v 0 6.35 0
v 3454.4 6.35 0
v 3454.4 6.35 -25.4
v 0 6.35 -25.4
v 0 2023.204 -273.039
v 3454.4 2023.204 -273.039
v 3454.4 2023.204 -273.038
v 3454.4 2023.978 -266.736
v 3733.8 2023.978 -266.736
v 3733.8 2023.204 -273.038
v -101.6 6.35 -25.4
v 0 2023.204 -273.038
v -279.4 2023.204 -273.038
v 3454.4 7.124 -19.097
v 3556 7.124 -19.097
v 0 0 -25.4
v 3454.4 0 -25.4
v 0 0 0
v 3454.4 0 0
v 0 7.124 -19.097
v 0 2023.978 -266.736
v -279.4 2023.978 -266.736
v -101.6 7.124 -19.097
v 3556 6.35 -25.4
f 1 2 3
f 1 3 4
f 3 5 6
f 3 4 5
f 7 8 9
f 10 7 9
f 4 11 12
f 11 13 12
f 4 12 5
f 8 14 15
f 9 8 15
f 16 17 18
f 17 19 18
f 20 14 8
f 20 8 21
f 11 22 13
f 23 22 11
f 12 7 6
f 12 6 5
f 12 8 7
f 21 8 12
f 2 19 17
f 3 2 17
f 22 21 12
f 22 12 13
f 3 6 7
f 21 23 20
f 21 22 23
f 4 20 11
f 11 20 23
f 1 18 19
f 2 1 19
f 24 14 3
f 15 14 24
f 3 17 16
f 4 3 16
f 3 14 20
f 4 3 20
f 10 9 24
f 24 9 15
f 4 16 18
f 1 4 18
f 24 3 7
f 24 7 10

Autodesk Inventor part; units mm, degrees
ref_plane "YZ Plane" through (0, 0, 0) normal (1, 0, 0) x (0, 1, 0)
ref_plane "XZ Plane" through (0, 0, 0) normal (0, 1, 0) x (-1, 0, 0)
sketch "Sketch1" plane through (0, 0, 0) normal (0, 1, 0) x (-1, 0, 0)
  line L0 (0, 0) -> (-3454.4, 0)
  line L1 (-3454.4, 0) -> (-3454.4, -25.4)
  line L2 (-3454.4, -25.4) -> (0, -25.4)
  line L3 (0, -25.4) -> (0, 0)
  dimension "d0" = 3454.4
  dimension "d1" = 25.4
extrude "bottomMateSurface" add sketch "Sketch1" along normal blind 6.35
ref_plane "Work Plane1" through (3454.4, 6.35, -25.4) normal (0, 0.9925, -0.1219) x (-1, 0, 0)
sketch "Sketch2" plane through (3454.4, 6.35, -25.4) normal (0, 0.9925, -0.1219) x (-1, 0, 0)
  line L0 (0, 6.35) -> (3454.4, 6.35)
  line L1 (3454.4, 6.35) -> (3454.4, 0)
  line L2 (3454.4, 0) -> (0, 0)
  line L3 (0, 0) -> (0, 6.35)
  point P0 (3454.4, 24.4368)
  dimension "d5" = 3454.4
  dimension "d6" = 6.35
extrude "centralPanelPortion" add sketch "Sketch2" along normal blind 2032
sketch "Sketch5" plane through (0, 7.1239, -19.0973) normal (0, 0.1219, 0.9925) x (1, 0, 0)
  line L0 (3454.4, 0) -> (3454.4, 2032) projected
  line L1 (0, 0) -> (0, 2032) projected
  line L2 (3454.4, 0) -> (3556, 0)
  line L3 (3454.4, 2032) -> (3733.8, 2032)
  line L4 (3733.8, 2032) -> (3556, 0)
  point P0 (0, -9.3981)
  dimension "d16" = 101.6
  dimension "d17" = 279.4
extrude "extensionRight" add sketch "Sketch5" against normal blind 6.35
sketch "Sketch6" plane through (0, 2023.9777, -266.7358) normal (0, 0.1219, 0.9925) x (1, 0, 0)
  line L0 (0, -2032) -> (0, 0) projected
  line L1 (0, -2032) -> (-101.6, -2032)
  line L2 (0, 0) -> (-279.4, 0)
  line L3 (-279.4, 0) -> (-101.6, -2032)
  point P0 (0, -2041.3981)
  dimension "d20" = 101.6
  dimension "d21" = 279.4
extrude "extensionLeft" add sketch "Sketch6" against normal blind 6.35
properties part number "2r4sci" material "Glass"
